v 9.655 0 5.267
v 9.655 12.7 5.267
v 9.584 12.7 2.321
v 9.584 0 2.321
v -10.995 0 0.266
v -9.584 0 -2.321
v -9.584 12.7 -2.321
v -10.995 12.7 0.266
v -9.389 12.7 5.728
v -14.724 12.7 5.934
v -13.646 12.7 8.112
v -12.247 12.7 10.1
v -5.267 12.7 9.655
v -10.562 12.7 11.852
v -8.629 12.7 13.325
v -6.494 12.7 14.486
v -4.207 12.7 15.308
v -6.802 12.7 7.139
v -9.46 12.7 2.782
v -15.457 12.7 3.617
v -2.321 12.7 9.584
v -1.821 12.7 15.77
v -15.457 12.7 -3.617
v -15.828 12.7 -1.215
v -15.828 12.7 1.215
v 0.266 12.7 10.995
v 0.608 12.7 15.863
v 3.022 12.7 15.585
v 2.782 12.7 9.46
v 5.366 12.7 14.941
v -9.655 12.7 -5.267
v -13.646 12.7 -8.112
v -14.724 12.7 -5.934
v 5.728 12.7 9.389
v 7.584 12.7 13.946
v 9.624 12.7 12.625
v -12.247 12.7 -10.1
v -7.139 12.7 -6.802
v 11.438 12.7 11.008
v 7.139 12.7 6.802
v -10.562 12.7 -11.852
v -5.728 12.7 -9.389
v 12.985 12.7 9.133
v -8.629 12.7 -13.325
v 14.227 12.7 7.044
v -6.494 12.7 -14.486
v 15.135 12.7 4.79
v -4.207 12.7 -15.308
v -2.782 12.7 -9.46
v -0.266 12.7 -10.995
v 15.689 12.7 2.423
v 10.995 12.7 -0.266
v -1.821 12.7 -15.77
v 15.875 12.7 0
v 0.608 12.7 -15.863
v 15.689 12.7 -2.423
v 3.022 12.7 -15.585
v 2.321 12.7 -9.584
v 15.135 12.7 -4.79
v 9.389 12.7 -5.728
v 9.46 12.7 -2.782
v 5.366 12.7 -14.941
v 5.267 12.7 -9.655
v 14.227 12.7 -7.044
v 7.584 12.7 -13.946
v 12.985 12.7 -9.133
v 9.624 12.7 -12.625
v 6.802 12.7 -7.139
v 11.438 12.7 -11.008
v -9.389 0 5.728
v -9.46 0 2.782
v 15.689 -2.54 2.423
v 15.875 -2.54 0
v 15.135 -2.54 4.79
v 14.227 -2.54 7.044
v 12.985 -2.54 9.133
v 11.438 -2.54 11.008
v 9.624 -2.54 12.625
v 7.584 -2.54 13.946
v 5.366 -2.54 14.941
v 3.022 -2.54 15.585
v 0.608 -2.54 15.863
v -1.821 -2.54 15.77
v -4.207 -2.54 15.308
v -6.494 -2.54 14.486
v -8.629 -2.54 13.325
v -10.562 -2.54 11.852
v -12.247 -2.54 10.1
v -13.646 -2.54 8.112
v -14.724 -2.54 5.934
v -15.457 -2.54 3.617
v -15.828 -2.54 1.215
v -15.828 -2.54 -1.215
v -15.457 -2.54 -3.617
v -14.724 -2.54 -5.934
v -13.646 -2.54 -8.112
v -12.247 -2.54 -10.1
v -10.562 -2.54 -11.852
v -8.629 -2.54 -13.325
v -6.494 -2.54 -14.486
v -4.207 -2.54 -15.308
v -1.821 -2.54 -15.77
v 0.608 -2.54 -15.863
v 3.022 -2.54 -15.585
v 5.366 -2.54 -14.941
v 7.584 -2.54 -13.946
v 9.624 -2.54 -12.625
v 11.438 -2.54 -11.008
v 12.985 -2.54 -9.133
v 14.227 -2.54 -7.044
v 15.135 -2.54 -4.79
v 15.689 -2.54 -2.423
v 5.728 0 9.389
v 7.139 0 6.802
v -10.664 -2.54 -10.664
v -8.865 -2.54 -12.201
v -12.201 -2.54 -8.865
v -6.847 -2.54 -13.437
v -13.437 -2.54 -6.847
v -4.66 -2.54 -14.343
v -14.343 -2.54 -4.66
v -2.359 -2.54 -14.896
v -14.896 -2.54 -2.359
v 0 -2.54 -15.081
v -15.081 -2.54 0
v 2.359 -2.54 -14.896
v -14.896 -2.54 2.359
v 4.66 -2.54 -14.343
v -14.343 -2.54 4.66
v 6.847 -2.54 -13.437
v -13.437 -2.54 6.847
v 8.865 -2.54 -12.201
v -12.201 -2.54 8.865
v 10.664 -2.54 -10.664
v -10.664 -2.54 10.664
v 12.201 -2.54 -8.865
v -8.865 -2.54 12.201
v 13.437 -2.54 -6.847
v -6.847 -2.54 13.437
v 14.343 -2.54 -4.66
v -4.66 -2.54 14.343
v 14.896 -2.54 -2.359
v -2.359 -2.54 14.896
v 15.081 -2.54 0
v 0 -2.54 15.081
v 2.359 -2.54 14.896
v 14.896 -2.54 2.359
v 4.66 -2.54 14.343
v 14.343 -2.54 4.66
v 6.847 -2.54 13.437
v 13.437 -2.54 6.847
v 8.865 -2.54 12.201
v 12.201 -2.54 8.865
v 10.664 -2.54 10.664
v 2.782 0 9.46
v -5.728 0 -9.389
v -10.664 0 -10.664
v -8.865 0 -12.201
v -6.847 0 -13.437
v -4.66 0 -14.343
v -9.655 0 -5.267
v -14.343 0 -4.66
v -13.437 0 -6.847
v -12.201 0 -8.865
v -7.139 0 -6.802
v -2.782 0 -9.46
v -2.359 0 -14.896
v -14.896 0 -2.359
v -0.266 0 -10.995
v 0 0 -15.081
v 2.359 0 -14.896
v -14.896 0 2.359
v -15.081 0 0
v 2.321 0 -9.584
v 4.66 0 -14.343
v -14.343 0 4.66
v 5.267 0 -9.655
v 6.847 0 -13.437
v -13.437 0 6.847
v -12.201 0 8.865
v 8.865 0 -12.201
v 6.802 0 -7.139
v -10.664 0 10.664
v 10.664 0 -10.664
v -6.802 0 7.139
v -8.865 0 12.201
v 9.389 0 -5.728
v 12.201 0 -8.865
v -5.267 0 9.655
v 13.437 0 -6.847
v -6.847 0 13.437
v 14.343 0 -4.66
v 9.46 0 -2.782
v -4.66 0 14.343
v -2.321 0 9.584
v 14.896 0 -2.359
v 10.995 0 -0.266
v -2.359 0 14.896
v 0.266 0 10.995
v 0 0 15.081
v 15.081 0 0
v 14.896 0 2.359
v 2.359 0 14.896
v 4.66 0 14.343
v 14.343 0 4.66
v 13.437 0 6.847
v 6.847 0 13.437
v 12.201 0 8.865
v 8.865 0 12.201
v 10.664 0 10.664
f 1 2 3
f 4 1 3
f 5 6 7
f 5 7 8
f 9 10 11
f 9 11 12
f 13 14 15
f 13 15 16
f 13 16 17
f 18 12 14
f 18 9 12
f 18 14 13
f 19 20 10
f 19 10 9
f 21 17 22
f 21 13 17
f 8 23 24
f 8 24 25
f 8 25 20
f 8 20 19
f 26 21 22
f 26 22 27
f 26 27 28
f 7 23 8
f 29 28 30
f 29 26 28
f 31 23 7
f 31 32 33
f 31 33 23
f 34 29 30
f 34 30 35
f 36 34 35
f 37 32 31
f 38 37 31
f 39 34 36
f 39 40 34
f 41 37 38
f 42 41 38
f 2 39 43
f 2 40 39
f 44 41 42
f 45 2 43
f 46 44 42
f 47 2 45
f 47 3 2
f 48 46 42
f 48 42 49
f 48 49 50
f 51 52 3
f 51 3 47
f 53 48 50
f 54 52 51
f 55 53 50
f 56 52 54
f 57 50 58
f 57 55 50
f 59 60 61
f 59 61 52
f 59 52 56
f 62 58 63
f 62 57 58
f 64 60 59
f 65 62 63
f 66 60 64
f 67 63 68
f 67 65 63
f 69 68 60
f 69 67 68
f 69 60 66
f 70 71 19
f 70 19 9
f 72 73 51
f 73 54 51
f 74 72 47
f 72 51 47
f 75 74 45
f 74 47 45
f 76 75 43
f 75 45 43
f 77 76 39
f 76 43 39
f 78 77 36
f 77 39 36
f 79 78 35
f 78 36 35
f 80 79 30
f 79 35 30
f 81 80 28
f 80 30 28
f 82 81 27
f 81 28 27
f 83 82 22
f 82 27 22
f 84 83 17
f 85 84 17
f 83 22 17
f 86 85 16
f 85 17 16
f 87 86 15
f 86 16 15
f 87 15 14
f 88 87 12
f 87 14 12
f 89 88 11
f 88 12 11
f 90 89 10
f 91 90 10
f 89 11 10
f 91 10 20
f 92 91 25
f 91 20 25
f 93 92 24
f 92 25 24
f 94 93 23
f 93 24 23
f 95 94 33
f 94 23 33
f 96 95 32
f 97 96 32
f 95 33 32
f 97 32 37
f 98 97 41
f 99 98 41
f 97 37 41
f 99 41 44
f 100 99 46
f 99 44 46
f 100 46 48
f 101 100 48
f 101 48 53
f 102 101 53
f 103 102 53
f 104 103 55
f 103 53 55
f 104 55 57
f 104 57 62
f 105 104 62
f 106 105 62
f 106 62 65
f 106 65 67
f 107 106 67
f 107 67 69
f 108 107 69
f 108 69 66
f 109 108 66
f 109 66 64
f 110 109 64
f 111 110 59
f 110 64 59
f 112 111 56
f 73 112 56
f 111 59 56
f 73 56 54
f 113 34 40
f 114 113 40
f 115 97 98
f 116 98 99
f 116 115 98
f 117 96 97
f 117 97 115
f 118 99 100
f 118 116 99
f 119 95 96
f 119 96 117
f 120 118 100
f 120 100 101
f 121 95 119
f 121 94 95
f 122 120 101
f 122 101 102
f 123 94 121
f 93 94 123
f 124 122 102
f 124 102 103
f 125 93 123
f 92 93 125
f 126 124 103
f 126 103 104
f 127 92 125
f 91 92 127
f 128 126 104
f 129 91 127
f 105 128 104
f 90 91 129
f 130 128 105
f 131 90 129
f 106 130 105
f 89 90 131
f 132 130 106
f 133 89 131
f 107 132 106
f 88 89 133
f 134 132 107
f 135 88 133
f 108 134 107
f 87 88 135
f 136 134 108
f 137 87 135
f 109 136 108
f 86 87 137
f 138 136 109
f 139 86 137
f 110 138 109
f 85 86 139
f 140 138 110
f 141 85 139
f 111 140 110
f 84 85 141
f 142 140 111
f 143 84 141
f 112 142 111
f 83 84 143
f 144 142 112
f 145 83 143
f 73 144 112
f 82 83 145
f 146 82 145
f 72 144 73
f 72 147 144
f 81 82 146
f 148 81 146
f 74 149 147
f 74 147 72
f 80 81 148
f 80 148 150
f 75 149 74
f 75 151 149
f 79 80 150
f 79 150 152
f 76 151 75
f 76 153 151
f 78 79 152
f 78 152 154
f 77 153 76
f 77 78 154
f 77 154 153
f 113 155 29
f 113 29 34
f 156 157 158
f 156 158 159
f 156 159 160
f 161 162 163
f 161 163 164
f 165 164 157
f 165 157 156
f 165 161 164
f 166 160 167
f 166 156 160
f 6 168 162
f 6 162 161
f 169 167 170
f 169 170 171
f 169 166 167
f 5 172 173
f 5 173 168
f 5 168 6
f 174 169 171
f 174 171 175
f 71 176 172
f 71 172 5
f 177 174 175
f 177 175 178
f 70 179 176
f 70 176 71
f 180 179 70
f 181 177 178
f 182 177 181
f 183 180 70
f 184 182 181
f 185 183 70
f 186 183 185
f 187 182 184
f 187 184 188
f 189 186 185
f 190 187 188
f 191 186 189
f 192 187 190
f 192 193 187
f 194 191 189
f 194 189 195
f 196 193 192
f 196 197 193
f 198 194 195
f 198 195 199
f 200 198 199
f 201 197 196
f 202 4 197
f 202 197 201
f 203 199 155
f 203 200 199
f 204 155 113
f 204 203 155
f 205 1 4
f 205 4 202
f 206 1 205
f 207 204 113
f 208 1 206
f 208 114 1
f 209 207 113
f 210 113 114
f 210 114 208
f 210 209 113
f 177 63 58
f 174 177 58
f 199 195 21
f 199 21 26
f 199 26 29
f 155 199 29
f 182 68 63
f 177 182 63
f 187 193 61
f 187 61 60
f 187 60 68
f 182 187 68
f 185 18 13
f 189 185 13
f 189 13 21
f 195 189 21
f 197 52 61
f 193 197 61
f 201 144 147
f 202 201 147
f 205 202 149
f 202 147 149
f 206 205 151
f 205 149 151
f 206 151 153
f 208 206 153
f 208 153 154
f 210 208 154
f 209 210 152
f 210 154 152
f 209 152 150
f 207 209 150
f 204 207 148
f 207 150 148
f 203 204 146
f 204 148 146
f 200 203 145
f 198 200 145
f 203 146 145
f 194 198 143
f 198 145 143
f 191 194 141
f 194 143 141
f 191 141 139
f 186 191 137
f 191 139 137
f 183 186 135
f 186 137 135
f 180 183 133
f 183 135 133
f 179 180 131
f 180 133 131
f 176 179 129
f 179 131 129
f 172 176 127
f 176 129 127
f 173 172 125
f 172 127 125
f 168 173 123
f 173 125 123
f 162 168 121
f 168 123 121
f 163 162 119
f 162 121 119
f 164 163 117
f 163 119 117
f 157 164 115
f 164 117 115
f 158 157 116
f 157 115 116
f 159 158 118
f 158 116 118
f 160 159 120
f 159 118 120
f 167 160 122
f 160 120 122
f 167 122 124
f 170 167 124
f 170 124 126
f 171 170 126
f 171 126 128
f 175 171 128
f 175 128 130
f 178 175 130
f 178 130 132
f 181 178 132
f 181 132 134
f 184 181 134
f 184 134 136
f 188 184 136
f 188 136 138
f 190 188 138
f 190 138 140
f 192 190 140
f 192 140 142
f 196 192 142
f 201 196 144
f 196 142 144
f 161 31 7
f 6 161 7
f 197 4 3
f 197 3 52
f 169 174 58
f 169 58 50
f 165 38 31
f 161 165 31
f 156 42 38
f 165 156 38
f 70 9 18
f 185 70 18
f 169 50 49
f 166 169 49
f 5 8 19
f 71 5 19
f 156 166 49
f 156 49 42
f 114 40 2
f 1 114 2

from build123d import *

# Parameters (mm, degrees)
SKETCH1_R           = 15.875
BOSS_EXTRUDE1_DEPTH = 12.7
CUT_EXTRUDE1_DEPTH  = 13.7
SKETCH3_R           = 15.875
BOSS_EXTRUDE2_DEPTH = 2.54
SKETCH4_R           = 15.08125
CUT_EXTRUDE2_DEPTH  = 2.54


with BuildPart() as part:
    # Sketch1 → Boss-Extrude1 (new body)
    with BuildSketch(Plane(origin=(0, 0, 0), x_dir=(1, 0, 0), z_dir=(0, 1, 0))):
        Circle(SKETCH1_R)
    extrude(amount=BOSS_EXTRUDE1_DEPTH)

    # Sketch2 → Cut-Extrude1 (cut, through all)
    with BuildSketch(Plane(origin=(0, 12.7, 0), x_dir=(1, 0, 0), z_dir=(0, 1, 0))):
        Polygon((-9.38920922, -5.728023239), (0.266009029, -10.995305325), (9.655218248, -5.267282086), (9.38920922, 5.728023239), (-0.266009029, 10.995305325), (-9.655218248, 5.267282086), align=None)
        Polygon((-5.267282086, -9.655218248), (5.728023239, -9.38920922), (10.995305325, 0.266009029), (5.267282086, 9.655218248), (-5.728023239, 9.38920922), (-10.995305325, -0.266009029), align=None)
        Polygon((-7.13938722, 6.802101287), (-2.781840057, 9.460486124), (-5.728023239, 9.38920922), align=None)
        Polygon((-9.583941344, 2.321098904), (-7.13938722, 6.802101287), (-9.655218248, 5.267282086), align=None)
        Polygon((-10.995305325, -0.266009029), (-9.460486124, -2.781840057), (-9.583941344, 2.321098904), align=None)
        Polygon((-9.38920922, -5.728023239), (-6.802101287, -7.13938722), (-9.460486124, -2.781840057), align=None)
        Polygon((-5.267282086, -9.655218248), (-2.321098904, -9.583941344), (-6.802101287, -7.13938722), align=None)
        Polygon((0.266009029, -10.995305325), (2.781840057, -9.460486124), (-2.321098904, -9.583941344), align=None)
        Polygon((5.728023239, -9.38920922), (7.13938722, -6.802101287), (2.781840057, -9.460486124), align=None)
        Polygon((7.13938722, -6.802101287), (9.655218248, -5.267282086), (9.583941344, -2.321098904), align=None)
        Polygon((9.460486124, 2.781840057), (9.583941344, -2.321098904), (10.995305325, 0.266009029), align=None)
        Polygon((6.802101287, 7.13938722), (9.460486124, 2.781840057), (9.38920922, 5.728023239), align=None)
        Polygon((2.321098904, 9.583941344), (6.802101287, 7.13938722), (5.267282086, 9.655218248), align=None)
        Polygon((-2.781840057, 9.460486124), (2.321098904, 9.583941344), (-0.266009029, 10.995305325), align=None)
    extrude(amount=-CUT_EXTRUDE1_DEPTH, mode=Mode.SUBTRACT)

    # Sketch3 → Boss-Extrude2 (add)
    with BuildSketch(Plane.XZ):
        Circle(SKETCH3_R)
    extrude(amount=BOSS_EXTRUDE2_DEPTH)

    # Sketch4 → Cut-Extrude2 (cut)
    with BuildSketch(Plane.XZ.offset(2.54)):
        Circle(SKETCH4_R)
    extrude(amount=-CUT_EXTRUDE2_DEPTH, mode=Mode.SUBTRACT)


solid = part.part
